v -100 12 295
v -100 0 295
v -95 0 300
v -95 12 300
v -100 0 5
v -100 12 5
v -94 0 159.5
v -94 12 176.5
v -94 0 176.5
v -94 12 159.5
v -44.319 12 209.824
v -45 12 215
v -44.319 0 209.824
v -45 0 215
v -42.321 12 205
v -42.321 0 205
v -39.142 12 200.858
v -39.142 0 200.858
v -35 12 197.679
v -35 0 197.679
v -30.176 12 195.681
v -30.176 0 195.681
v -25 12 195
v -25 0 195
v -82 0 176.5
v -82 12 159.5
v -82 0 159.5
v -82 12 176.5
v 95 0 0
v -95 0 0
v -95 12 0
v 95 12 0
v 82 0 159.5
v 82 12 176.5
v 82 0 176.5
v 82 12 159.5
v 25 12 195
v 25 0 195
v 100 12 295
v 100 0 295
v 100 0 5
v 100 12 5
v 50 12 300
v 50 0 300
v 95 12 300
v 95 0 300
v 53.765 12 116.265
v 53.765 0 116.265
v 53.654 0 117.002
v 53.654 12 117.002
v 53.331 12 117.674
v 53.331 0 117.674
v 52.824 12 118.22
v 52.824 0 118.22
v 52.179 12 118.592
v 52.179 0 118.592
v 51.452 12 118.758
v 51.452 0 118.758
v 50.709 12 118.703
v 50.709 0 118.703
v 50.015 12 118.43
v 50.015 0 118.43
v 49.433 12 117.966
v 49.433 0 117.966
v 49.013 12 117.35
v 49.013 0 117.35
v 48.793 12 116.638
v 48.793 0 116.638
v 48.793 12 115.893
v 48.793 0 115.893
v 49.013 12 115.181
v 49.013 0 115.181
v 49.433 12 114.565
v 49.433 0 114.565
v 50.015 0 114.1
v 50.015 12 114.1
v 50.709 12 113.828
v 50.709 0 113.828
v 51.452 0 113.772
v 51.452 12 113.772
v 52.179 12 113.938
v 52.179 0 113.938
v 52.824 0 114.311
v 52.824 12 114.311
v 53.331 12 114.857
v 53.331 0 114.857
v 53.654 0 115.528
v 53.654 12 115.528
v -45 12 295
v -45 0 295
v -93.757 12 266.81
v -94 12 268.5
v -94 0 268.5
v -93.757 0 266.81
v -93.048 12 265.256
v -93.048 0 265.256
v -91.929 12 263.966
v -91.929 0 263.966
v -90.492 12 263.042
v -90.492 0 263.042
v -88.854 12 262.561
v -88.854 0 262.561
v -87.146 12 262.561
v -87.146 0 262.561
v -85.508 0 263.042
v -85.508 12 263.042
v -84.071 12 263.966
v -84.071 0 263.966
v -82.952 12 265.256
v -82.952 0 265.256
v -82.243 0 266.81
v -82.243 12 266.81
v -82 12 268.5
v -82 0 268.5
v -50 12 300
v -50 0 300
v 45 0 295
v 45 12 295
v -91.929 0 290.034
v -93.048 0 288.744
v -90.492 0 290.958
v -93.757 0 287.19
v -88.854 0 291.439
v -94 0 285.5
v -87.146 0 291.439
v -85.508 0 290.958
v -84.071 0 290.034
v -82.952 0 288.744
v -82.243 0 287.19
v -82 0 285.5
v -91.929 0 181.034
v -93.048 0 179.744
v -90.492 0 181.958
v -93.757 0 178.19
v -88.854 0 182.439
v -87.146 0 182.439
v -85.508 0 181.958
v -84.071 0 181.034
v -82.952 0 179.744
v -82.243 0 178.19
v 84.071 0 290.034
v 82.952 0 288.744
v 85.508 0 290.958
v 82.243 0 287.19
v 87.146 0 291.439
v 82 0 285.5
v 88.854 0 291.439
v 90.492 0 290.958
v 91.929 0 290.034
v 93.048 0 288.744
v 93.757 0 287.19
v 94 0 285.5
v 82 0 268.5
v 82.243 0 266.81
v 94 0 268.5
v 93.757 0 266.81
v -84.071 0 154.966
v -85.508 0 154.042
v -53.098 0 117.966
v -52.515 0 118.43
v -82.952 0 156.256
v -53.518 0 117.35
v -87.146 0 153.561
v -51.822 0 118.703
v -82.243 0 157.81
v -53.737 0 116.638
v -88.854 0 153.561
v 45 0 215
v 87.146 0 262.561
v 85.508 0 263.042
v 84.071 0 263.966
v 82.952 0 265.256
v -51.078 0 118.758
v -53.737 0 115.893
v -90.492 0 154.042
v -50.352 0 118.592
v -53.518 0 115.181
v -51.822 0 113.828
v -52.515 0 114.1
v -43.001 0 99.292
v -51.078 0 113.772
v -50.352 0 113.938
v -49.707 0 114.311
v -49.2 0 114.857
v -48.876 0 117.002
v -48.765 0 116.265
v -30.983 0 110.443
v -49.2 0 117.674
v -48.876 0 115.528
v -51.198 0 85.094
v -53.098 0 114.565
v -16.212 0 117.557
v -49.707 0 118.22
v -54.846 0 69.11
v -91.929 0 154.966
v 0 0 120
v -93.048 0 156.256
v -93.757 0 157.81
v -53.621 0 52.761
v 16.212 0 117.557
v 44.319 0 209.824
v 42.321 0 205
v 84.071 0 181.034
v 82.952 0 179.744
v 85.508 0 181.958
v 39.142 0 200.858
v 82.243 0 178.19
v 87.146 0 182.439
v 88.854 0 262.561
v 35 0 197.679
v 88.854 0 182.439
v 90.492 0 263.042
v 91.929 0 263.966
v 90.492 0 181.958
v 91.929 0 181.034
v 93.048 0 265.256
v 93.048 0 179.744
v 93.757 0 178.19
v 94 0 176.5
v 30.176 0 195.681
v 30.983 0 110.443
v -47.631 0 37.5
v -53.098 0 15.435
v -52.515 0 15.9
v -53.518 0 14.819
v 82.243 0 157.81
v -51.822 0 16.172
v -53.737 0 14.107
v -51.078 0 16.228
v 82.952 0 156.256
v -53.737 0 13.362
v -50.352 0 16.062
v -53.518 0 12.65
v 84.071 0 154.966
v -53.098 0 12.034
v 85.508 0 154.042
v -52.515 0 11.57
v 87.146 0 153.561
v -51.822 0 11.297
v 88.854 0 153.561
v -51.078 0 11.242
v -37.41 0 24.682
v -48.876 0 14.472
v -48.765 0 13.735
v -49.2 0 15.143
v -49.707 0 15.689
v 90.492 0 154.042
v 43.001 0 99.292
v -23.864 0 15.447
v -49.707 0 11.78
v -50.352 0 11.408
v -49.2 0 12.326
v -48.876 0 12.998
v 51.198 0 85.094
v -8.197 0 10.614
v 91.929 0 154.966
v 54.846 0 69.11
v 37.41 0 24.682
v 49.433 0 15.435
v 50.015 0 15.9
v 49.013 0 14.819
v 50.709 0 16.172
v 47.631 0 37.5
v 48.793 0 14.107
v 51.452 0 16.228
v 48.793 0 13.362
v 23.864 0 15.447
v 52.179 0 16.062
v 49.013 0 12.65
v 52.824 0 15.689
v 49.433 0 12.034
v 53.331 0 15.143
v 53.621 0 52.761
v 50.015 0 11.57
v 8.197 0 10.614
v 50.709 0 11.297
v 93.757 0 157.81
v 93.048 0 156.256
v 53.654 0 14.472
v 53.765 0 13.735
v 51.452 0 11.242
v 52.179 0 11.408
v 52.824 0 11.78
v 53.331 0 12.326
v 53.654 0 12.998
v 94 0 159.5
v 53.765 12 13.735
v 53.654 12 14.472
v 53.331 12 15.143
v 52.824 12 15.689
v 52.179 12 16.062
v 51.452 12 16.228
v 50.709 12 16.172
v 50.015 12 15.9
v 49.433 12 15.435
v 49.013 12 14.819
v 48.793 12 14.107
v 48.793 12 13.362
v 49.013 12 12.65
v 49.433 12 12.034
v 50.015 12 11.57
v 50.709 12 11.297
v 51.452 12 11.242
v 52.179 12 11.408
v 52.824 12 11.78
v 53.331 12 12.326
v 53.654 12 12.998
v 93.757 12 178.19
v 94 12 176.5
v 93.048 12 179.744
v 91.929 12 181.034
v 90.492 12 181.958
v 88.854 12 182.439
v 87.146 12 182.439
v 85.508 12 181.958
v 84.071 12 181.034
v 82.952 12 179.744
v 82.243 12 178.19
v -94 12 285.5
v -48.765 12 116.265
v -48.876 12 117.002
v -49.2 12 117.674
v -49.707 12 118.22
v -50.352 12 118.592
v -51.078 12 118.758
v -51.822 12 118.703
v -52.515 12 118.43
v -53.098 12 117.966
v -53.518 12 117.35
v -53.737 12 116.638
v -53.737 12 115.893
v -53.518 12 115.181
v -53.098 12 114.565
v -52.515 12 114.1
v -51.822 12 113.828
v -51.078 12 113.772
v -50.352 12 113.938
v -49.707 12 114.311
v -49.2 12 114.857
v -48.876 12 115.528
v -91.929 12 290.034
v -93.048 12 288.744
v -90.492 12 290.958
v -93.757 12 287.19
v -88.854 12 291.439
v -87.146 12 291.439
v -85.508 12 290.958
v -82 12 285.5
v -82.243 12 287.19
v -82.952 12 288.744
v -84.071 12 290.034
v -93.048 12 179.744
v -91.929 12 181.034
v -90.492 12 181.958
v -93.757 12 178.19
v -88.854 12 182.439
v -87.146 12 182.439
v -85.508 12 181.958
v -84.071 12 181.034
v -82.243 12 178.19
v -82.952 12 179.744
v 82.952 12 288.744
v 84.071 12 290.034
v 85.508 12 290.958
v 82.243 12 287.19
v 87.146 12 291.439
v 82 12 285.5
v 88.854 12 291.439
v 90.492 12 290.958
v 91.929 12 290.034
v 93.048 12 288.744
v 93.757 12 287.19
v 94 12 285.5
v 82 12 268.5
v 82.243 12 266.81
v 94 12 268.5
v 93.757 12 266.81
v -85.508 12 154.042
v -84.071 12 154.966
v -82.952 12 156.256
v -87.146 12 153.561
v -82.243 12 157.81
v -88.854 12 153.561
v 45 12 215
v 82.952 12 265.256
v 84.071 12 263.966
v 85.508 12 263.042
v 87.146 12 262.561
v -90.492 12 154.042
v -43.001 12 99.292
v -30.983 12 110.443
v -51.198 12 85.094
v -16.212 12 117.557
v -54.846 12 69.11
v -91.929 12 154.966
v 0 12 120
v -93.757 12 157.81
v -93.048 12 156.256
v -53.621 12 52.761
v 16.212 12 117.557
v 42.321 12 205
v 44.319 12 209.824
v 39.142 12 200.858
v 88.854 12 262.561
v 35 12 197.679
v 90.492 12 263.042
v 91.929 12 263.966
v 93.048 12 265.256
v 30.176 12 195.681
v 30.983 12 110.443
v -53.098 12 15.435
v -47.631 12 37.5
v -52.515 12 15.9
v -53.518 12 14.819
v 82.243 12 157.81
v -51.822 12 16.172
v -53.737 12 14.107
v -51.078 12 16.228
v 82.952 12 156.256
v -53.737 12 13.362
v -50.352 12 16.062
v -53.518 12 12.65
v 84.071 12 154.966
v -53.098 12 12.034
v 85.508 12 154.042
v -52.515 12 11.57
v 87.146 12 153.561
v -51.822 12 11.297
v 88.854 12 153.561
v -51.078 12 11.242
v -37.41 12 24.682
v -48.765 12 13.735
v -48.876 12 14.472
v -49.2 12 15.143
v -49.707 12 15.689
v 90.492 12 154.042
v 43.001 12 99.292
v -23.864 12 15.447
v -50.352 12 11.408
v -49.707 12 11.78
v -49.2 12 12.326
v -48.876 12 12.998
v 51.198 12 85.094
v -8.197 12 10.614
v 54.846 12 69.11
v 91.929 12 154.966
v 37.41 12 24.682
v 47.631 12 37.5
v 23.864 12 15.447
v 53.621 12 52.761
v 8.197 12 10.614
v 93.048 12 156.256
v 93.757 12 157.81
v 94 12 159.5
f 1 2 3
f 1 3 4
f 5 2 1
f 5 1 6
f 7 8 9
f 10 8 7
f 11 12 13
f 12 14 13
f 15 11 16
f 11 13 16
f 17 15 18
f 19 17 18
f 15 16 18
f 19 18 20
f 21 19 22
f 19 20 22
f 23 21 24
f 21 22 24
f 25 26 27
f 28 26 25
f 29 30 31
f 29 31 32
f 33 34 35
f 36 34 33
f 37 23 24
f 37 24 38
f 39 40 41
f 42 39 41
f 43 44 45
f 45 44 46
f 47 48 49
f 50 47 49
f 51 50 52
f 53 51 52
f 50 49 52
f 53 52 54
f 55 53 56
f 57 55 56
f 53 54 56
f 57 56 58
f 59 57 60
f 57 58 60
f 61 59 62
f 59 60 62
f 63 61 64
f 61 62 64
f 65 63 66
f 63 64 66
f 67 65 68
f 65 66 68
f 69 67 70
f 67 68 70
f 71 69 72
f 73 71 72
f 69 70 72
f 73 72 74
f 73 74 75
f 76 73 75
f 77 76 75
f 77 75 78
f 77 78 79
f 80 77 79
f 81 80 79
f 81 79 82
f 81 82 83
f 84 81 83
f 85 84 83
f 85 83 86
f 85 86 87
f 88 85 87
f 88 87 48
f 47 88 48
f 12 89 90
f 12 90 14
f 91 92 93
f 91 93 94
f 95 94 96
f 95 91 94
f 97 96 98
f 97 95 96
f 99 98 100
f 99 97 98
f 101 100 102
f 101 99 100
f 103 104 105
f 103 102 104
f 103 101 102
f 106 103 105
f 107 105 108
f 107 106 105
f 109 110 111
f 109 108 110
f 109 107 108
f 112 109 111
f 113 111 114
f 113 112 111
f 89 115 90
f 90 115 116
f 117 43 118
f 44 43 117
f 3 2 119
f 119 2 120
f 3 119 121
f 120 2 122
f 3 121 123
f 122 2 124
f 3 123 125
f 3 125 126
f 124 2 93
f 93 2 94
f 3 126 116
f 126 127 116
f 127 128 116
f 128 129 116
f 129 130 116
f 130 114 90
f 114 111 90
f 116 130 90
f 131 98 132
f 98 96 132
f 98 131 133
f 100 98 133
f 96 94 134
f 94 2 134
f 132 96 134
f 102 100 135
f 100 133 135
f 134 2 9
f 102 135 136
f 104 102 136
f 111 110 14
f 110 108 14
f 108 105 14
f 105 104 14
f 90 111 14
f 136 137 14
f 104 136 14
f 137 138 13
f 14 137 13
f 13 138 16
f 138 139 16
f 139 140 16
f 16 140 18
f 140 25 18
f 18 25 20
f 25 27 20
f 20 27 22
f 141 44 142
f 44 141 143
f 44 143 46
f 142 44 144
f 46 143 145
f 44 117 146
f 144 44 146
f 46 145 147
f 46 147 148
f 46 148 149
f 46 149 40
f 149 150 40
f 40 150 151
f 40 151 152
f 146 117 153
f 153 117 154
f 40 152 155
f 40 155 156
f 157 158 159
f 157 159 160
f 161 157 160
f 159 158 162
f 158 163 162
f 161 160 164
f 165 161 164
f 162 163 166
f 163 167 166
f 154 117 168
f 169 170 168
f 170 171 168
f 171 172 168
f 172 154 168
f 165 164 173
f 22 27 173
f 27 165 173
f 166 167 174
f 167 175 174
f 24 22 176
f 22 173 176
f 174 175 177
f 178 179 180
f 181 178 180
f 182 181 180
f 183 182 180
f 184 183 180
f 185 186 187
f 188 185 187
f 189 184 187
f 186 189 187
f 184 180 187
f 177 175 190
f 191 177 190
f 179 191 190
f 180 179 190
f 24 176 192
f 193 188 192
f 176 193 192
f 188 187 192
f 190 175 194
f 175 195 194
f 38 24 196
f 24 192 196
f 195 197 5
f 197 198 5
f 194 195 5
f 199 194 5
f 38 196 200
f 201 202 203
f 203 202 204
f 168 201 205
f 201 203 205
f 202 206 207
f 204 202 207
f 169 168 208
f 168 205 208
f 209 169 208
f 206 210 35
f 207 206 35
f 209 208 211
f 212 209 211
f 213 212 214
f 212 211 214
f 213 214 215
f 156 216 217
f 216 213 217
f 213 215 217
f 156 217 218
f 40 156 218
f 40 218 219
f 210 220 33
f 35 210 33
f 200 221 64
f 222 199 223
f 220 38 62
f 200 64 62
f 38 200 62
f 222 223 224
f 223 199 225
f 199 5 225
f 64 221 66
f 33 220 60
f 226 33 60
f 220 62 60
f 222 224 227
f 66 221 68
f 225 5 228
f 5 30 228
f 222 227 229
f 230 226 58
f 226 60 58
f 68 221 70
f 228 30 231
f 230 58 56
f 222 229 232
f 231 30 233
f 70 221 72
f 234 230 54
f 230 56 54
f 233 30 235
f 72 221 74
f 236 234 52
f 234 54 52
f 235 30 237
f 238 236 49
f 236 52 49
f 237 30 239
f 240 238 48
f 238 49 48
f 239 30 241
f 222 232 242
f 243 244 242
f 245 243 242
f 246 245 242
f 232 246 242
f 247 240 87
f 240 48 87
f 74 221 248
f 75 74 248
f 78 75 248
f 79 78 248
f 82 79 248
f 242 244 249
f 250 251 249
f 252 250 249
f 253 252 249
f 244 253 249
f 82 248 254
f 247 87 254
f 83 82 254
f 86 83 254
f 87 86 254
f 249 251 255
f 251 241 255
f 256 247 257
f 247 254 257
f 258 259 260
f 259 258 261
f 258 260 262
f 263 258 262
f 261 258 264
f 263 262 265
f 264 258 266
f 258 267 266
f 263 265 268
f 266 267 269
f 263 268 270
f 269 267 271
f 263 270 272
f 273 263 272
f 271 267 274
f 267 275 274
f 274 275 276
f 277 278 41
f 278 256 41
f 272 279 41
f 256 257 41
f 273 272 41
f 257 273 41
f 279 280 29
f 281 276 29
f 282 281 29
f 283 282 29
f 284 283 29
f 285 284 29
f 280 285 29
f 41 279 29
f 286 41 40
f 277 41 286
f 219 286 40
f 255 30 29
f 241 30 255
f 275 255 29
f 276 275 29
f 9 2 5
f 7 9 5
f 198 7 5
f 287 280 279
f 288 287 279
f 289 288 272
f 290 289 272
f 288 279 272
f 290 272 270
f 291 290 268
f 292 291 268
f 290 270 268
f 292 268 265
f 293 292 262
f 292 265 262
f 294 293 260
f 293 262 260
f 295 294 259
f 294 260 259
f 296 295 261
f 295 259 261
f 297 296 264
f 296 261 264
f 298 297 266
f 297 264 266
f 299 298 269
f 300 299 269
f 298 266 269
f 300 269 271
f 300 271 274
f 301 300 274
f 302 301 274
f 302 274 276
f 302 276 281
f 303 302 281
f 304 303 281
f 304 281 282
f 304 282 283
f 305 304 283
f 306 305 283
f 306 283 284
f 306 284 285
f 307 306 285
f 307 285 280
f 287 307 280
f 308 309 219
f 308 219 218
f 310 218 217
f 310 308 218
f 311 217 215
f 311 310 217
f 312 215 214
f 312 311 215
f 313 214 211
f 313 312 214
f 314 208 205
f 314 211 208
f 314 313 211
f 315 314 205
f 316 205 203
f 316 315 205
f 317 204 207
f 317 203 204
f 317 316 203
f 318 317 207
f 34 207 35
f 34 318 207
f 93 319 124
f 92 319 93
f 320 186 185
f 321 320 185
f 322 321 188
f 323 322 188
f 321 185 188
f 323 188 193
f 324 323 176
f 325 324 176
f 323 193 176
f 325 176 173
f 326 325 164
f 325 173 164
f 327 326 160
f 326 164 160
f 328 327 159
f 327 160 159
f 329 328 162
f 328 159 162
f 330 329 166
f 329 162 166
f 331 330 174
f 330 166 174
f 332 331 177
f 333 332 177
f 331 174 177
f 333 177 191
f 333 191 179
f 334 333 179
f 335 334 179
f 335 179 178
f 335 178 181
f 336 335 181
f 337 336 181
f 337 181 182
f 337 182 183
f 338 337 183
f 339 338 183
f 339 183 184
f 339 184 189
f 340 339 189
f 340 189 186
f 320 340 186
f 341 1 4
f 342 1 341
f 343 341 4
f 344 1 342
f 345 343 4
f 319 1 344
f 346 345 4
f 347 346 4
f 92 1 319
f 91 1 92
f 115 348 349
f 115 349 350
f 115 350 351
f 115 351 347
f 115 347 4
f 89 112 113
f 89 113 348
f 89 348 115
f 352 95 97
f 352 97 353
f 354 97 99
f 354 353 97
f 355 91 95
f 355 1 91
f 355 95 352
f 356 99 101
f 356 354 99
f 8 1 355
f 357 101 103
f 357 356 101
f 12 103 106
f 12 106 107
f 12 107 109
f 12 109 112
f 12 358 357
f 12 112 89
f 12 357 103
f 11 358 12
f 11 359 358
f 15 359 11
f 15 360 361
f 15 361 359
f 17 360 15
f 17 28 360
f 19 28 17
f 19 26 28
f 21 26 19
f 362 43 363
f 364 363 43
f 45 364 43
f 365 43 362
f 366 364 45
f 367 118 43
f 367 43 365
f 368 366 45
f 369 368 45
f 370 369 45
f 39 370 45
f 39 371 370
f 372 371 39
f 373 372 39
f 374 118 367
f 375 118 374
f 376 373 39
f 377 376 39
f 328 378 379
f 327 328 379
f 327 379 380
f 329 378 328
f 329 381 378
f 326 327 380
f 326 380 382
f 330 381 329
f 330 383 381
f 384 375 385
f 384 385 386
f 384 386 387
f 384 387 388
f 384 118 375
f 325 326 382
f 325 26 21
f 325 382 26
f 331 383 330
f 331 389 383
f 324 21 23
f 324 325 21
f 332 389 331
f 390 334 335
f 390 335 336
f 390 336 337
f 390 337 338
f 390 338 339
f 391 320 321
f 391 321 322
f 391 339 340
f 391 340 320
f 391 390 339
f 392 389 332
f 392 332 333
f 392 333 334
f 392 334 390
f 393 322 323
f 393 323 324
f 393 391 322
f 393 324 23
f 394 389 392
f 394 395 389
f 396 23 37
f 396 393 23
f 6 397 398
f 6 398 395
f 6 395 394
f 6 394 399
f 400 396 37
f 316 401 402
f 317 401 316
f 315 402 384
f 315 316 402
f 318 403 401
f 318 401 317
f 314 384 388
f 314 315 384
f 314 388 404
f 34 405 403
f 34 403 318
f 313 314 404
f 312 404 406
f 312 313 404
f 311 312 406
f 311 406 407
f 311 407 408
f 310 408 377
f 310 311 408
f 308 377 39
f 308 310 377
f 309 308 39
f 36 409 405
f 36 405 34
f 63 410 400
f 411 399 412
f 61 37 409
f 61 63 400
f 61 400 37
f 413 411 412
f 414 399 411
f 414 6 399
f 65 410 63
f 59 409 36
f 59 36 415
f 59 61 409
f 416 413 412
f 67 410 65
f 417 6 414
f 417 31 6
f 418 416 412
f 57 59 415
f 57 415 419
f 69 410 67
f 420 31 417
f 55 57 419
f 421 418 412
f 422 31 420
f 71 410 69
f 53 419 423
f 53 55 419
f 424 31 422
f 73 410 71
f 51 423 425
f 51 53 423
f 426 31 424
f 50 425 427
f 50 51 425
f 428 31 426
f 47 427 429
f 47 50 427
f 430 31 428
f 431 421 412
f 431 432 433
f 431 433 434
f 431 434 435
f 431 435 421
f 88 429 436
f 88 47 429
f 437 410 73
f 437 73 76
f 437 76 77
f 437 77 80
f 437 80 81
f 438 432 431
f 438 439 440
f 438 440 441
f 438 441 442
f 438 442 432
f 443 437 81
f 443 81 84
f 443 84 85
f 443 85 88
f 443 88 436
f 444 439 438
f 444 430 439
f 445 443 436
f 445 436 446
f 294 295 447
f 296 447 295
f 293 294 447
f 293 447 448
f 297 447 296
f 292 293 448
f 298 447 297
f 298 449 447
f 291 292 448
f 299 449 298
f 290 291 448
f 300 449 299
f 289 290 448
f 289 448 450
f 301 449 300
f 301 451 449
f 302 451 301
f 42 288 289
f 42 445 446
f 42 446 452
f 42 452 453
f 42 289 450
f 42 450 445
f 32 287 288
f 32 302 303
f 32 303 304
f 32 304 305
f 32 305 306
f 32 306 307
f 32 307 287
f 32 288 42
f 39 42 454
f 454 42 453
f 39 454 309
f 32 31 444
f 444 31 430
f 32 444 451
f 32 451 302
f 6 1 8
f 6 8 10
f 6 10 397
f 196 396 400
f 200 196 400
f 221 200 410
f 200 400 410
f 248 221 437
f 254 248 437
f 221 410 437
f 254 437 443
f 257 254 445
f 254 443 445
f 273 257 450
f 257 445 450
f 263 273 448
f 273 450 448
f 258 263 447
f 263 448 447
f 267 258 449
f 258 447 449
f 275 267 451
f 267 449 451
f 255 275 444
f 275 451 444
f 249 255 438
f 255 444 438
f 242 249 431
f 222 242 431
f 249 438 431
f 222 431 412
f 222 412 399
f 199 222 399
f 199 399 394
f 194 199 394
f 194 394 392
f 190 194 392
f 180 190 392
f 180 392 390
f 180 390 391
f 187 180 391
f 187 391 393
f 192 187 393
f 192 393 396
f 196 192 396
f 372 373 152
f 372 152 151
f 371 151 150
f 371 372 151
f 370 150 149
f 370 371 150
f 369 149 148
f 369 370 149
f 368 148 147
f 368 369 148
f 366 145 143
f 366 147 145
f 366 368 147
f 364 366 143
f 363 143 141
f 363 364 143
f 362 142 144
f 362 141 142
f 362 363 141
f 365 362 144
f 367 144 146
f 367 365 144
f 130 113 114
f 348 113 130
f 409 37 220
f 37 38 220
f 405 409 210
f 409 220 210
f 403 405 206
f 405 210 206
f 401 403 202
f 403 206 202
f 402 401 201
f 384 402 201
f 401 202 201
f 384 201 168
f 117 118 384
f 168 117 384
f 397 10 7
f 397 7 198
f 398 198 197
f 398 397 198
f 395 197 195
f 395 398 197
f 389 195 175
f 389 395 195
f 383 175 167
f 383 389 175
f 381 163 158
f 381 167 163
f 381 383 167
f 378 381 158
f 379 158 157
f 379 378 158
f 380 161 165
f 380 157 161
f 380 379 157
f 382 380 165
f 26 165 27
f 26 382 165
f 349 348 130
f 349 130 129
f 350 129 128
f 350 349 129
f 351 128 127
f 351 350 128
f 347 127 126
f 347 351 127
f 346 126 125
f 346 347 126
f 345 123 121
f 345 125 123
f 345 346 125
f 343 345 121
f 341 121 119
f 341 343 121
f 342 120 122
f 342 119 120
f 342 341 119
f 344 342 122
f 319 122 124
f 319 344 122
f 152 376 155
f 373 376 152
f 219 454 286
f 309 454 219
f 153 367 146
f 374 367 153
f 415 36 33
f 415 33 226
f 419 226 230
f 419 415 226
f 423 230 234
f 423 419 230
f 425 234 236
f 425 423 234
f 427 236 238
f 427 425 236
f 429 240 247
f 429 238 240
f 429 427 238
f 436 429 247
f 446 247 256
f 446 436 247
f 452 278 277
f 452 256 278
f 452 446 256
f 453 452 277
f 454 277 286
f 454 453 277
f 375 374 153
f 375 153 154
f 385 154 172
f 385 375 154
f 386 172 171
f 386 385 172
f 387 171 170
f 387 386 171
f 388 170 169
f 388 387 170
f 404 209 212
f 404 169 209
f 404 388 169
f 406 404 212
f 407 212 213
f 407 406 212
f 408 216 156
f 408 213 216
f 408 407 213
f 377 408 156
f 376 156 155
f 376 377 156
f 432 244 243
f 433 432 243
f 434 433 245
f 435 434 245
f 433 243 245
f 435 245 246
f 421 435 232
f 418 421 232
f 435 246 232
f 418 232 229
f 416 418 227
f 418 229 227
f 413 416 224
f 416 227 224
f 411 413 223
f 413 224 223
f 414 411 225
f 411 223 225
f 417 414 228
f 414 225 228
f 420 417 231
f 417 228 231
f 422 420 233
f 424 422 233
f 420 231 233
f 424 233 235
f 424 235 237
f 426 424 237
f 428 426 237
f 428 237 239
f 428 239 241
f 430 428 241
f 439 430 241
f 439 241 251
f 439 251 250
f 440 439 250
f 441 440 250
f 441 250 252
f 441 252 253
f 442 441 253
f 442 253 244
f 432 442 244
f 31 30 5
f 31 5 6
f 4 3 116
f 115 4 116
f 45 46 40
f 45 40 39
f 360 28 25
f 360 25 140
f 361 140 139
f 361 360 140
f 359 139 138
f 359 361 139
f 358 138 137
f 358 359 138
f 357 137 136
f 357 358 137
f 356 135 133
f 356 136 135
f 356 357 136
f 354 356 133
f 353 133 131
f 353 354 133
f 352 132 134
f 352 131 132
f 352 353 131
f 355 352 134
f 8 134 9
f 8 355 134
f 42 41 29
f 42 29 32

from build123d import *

# Parameters (mm, degrees)
SKETCH1_W             = 200
SKETCH1_H             = 300
BOSS_EXTRUDE1_DEPTH   = 12
CUT_EXTRUDE1_REACH    = 318.455
SKETCH2_W             = 90
SKETCH2_H             = 105
CUT_EXTRUDE2_REACH    = 318.455
SKETCH3_R             = 55
CUT_EXTRUDE3_REACH    = 318.455
M6X1_0_TAPPED_HOLE1_D = 5
FILLET1_R             = 20
CHAMFER1_SIZE         = 5


with BuildPart() as part:
    # Sketch1 → Boss-Extrude1 (new body)
    with BuildSketch(Plane(origin=(0, 0, 0), x_dir=(1, 0, 0), z_dir=(0, 1, 0))):
        with Locations((0, -150)):
            Rectangle(SKETCH1_W, SKETCH1_H)
    extrude(amount=BOSS_EXTRUDE1_DEPTH)

    # Sketch2 → Cut-Extrude1 (cut, up to next)
    with BuildSketch(Plane(origin=(0, 12, 0), x_dir=(1, 0, 0), z_dir=(0, 1, 0)), mode=Mode.PRIVATE) as cut_extrude1_sk1:
        with Locations((0, -247.5)):
            Rectangle(SKETCH2_W, SKETCH2_H)
    cut_extrude1_tool1 = extrude(cut_extrude1_sk1.sketch, amount=-CUT_EXTRUDE1_REACH, mode=Mode.PRIVATE) & part.part
    add(cut_extrude1_tool1.solids().sort_by_distance((0, 12, 247.5))[0], mode=Mode.SUBTRACT)

    # Sketch3 → Cut-Extrude2 (cut, up to next)
    with BuildSketch(Plane(origin=(0, 12, 0), x_dir=(1, 0, 0), z_dir=(0, 1, 0)), mode=Mode.PRIVATE) as cut_extrude2_sk1:
        with Locations(Location((0, -65, 0), (0, 0, 270))):
            Circle(SKETCH3_R)
    cut_extrude2_tool1 = extrude(cut_extrude2_sk1.sketch, amount=-CUT_EXTRUDE2_REACH, mode=Mode.PRIVATE) & part.part
    add(cut_extrude2_tool1.solids().sort_by_distance((0, 12, 65))[0], mode=Mode.SUBTRACT)

    # Sketch4 → Cut-Extrude3 (cut, up to next)
    with BuildSketch(Plane(origin=(0, 12, 0), x_dir=(1, 0, 0), z_dir=(0, 1, 0)), mode=Mode.PRIVATE) as cut_extrude3_sk1:
        with BuildLine():
            Line((-82, -268.5), (-82, -285.5))
            ThreePointArc((-82, -285.5), (-88, -291.5), (-94, -285.5))
            Line((-94, -285.5), (-94, -268.5))
            ThreePointArc((-94, -268.5), (-88, -262.5), (-82, -268.5))
        make_face()
    cut_extrude3_tool1 = extrude(cut_extrude3_sk1.sketch, amount=-CUT_EXTRUDE3_REACH, mode=Mode.PRIVATE) & part.part
    # Sketch4 → Cut-Extrude3 (cut, up to next)
    with BuildSketch(Plane(origin=(0, 12, 0), x_dir=(1, 0, 0), z_dir=(0, 1, 0)), mode=Mode.PRIVATE) as cut_extrude3_sk2:
        with BuildLine():
            Line((94, -268.5), (94, -285.5))
            ThreePointArc((94, -285.5), (88, -291.5), (82, -285.5))
            Line((82, -285.5), (82, -268.5))
            ThreePointArc((82, -268.5), (88, -262.5), (94, -268.5))
        make_face()
    cut_extrude3_tool2 = extrude(cut_extrude3_sk2.sketch, amount=-CUT_EXTRUDE3_REACH, mode=Mode.PRIVATE) & part.part
    # Sketch4 → Cut-Extrude3 (cut, up to next)
    with BuildSketch(Plane(origin=(0, 12, 0), x_dir=(1, 0, 0), z_dir=(0, 1, 0)), mode=Mode.PRIVATE) as cut_extrude3_sk3:
        with BuildLine():
            Line((-94, -176.5), (-94, -159.5))
            ThreePointArc((-94, -159.5), (-88, -153.5), (-82, -159.5))
            Line((-82, -159.5), (-82, -176.5))
            ThreePointArc((-82, -176.5), (-88, -182.5), (-94, -176.5))
        make_face()
    cut_extrude3_tool3 = extrude(cut_extrude3_sk3.sketch, amount=-CUT_EXTRUDE3_REACH, mode=Mode.PRIVATE) & part.part
    # Sketch4 → Cut-Extrude3 (cut, up to next)
    with BuildSketch(Plane(origin=(0, 12, 0), x_dir=(1, 0, 0), z_dir=(0, 1, 0)), mode=Mode.PRIVATE) as cut_extrude3_sk4:
        with BuildLine():
            Line((82, -176.5), (82, -159.5))
            ThreePointArc((82, -159.5), (88, -153.5), (94, -159.5))
            Line((94, -159.5), (94, -176.5))
            ThreePointArc((94, -176.5), (88, -182.5), (82, -176.5))
        make_face()
    cut_extrude3_tool4 = extrude(cut_extrude3_sk4.sketch, amount=-CUT_EXTRUDE3_REACH, mode=Mode.PRIVATE) & part.part
    add(cut_extrude3_tool1.solids().sort_by_distance((-88, 12, 277))[0], mode=Mode.SUBTRACT)
    add(cut_extrude3_tool2.solids().sort_by_distance((88, 12, 277))[0], mode=Mode.SUBTRACT)
    add(cut_extrude3_tool3.solids().sort_by_distance((-88, 12, 168))[0], mode=Mode.SUBTRACT)
    add(cut_extrude3_tool4.solids().sort_by_distance((88, 12, 168))[0], mode=Mode.SUBTRACT)

    # M6x1.0 Tapped Hole1 (through all)
    with Locations(Plane(origin=(0, 12, 0), x_dir=(-1, 0, 0), z_dir=(0, 1, 0))):
        with Locations((-51.265241636, 116.265241636), (51.265241636, 116.265241636), (-51.265241636, 13.734758364), (51.265241636, 13.734758364)):
            Hole(M6X1_0_TAPPED_HOLE1_D / 2)

    # Fillet1
    fillet1_edges = [part.edges().sort_by_distance(p)[0] for p in [
        (-45, 6, 195),
        (45, 6, 195),
    ]]
    fillet(fillet1_edges, radius=FILLET1_R)

    # Chamfer1
    chamfer1_edges = [part.edges().sort_by_distance(p)[0] for p in [
        (-45, 6, 300),
        (45, 6, 300),
        (-100, 6, 0),
        (100, 6, 0),
        (100, 6, 300),
        (-100, 6, 300),
    ]]
    chamfer(chamfer1_edges, length=CHAMFER1_SIZE)


solid = part.part
